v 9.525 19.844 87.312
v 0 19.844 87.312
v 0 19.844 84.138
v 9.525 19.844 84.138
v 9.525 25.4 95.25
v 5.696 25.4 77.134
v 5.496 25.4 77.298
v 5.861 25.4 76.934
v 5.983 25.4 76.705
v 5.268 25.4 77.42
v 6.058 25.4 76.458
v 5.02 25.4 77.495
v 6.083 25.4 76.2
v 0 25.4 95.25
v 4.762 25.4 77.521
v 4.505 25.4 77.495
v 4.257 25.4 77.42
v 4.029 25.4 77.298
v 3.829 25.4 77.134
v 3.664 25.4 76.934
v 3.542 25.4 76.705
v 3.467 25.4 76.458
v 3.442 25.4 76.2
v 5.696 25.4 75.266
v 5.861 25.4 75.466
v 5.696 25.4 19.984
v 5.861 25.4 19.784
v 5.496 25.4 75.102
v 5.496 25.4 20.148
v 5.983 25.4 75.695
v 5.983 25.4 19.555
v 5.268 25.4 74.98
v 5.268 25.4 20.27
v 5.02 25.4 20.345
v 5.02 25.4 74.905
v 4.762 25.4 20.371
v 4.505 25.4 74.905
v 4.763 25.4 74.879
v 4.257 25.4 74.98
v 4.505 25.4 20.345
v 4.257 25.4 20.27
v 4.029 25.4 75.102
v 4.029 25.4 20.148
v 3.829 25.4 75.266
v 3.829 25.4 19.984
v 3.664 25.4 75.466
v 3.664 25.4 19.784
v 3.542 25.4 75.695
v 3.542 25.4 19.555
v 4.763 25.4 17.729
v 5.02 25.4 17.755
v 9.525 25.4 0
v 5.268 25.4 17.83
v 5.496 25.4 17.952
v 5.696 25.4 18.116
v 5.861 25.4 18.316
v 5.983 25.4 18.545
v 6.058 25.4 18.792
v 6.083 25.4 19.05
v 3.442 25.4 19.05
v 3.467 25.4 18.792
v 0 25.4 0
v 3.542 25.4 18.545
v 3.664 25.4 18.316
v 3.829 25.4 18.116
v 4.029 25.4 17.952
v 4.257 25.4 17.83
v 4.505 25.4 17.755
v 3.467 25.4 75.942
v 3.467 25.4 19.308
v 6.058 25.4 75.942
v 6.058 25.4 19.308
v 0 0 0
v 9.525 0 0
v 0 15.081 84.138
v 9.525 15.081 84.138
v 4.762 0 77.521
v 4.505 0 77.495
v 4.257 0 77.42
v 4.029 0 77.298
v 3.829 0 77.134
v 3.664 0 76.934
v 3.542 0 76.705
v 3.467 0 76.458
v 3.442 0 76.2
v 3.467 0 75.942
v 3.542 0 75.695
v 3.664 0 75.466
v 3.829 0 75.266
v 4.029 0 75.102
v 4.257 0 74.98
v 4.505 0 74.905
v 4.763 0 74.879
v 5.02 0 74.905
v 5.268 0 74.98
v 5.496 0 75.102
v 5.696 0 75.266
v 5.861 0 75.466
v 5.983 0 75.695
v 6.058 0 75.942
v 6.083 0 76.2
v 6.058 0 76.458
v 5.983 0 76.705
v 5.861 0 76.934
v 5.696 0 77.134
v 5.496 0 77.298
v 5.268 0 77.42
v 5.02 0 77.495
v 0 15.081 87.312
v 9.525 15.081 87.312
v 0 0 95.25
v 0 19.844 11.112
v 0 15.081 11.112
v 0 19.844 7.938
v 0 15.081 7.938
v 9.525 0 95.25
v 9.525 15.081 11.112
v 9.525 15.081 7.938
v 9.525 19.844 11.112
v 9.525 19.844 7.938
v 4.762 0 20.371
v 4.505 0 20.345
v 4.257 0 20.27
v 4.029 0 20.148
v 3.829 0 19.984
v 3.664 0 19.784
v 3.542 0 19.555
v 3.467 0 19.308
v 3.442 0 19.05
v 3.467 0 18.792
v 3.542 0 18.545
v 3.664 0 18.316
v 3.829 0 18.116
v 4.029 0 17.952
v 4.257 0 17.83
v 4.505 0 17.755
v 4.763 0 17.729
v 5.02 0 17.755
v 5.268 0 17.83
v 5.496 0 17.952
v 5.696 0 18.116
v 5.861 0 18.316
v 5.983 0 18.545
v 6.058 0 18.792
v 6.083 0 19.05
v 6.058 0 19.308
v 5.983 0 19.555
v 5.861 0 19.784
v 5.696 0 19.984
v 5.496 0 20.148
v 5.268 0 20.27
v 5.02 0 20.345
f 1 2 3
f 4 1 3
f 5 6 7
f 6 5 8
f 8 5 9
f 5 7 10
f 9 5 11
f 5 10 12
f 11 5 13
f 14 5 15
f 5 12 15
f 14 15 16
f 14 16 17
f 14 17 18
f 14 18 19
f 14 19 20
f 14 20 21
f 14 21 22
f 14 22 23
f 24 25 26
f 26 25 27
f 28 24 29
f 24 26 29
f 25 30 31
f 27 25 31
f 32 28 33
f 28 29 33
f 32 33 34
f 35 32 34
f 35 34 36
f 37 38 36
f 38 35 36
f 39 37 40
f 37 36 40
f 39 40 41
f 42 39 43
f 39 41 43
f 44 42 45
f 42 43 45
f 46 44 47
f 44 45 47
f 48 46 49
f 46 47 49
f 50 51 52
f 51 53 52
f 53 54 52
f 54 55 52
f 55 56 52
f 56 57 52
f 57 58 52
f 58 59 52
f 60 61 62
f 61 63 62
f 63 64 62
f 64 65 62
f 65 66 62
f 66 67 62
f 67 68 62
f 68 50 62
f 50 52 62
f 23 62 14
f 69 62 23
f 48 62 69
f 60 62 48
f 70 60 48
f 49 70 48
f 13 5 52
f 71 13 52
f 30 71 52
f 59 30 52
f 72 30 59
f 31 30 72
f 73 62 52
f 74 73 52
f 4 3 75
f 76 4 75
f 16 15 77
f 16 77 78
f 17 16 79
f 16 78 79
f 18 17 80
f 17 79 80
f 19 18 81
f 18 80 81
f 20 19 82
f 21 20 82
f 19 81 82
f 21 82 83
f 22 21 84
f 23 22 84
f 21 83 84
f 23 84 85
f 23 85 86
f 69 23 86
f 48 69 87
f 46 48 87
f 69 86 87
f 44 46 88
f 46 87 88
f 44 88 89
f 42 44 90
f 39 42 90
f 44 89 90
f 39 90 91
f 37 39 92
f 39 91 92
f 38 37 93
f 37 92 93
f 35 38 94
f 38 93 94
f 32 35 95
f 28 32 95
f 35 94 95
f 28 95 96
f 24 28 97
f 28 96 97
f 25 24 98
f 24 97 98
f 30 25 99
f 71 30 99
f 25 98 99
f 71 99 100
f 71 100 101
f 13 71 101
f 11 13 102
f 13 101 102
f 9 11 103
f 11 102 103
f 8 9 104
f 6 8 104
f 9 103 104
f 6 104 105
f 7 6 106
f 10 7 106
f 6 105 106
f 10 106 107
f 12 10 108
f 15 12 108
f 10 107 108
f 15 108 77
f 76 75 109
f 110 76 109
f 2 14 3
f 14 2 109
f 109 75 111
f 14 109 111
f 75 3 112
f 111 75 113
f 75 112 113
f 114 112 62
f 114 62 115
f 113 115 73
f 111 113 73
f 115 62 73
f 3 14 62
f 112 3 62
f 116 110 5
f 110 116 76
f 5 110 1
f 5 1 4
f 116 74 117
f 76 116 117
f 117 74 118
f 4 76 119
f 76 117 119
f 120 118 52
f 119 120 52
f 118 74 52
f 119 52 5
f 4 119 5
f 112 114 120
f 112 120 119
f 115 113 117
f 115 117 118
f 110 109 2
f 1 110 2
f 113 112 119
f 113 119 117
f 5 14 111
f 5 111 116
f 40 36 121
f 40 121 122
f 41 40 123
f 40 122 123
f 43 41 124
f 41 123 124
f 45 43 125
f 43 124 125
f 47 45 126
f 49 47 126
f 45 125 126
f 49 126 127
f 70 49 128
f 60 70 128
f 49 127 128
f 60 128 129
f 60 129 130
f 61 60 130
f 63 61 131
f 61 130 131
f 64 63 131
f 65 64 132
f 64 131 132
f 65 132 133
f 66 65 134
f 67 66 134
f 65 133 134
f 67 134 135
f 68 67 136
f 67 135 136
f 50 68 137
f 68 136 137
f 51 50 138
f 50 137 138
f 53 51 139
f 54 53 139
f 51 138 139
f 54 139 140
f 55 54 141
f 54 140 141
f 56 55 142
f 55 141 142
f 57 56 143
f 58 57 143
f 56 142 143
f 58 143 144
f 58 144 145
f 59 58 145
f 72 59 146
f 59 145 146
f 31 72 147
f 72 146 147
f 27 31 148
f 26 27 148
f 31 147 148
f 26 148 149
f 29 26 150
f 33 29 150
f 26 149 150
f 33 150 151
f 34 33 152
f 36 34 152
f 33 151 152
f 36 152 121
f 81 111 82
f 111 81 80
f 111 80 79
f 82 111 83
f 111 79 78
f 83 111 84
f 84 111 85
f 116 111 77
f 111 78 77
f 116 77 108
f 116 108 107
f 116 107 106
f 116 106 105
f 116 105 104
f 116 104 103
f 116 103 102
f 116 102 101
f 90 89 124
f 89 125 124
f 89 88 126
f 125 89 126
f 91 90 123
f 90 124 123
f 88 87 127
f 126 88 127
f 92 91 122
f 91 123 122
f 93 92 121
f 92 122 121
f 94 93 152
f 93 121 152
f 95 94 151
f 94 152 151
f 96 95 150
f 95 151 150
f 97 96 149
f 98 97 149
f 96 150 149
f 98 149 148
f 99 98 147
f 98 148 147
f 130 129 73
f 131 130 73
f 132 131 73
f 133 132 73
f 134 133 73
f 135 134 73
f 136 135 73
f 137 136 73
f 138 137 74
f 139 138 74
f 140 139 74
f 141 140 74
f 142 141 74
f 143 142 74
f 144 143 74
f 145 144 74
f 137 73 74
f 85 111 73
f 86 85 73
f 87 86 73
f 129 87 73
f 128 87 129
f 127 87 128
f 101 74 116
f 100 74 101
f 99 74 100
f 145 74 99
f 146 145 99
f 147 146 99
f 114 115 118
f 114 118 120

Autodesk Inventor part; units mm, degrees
ref_plane "YZ Plane" through (0, 0, 0) normal (1, 0, 0) x (0, 1, 0)
ref_plane "XZ Plane" through (0, 0, 0) normal (0, 1, 0) x (-1, 0, 0)
ref_plane "XY Plane" through (0, 0, 0) normal (0, 0, 1) x (1, 0, 0)
sketch "Sketch1" plane through (0, 0, 0) normal (0, 0, 1) x (1, 0, 0)
  line L0 (0, 0) -> (9.525, 0)
  line L1 (9.525, 0) -> (9.525, 25.4)
  line L2 (9.525, 25.4) -> (0, 25.4)
  line L3 (0, 25.4) -> (0, 0)
  dimension "d0" = 9.525
  dimension "d1" = 25.4
extrude "Extrusion1" add sketch "Sketch1" along normal blind 95.25
sketch "Sketch2" plane through (0, 25.4, 0) normal (0, 1, 0) x (1, 0, 0)
  line L0 (0, 0) -> (0, -95.25) construction
  line L1 (0, -47.625) -> (9.525, -47.625) construction
  line L2 (9.525, 0) -> (9.525, -95.25) construction
  point P0 (4.7625, -19.05)
  point P1 (4.7625, -76.2)
  dimension "d4" = 19.05
  dimension "d5" = 4.7625
hole "Hole1" at (4.7625, 25.4, 19.05) at (4.7625, 25.4, 76.2) direction (0, -1, 0) diameter 2.6416 end through all thread size "6-32 UNC" class "2B" standard "ANSI Unified Screw Threads"
sketch "Sketch3" plane through (0, 0, 0) normal (-1, 0, 0) x (0, 0, 1)
  line L0 (0, 25.4) -> (0, 0) construction
  line L1 (0, 0) -> (95.25, 0) construction
  line L2 (95.25, 25.4) -> (95.25, 0) construction
  line L3 (0, 25.4) -> (95.25, 25.4) construction
  line L4 (7.9375, 19.8438) -> (11.1125, 19.8438)
  line L5 (11.1125, 19.8438) -> (11.1125, 15.0812)
  line L6 (11.1125, 15.0812) -> (7.9375, 15.0812)
  line L7 (7.9375, 15.0812) -> (7.9375, 19.8438)
  line L8 (7.9375, 19.8438) -> (11.1125, 15.0812) construction
  line L9 (11.1125, 19.8438) -> (7.9375, 15.0812) construction
  line L10 (0, 0) -> (95.25, 0) construction
  line L11 (47.625, 0) -> (47.625, 25.4) construction
  line L12 (87.3125, 19.8438) -> (84.1375, 19.8438)
  line L13 (84.1375, 19.8438) -> (84.1375, 15.0813)
  line L14 (84.1375, 15.0813) -> (87.3125, 15.0813)
  line L15 (87.3125, 15.0813) -> (87.3125, 19.8438)
  line L16 (87.3125, 19.8438) -> (84.1375, 15.0813) construction
  line L17 (84.1375, 19.8438) -> (87.3125, 15.0813) construction
  point P0 (9.525, 17.4625)
  point P1 (85.725, 17.4625)
  dimension "d13" = 3.175
  dimension "d14" = 4.7625
  dimension "d15" = 9.525
  dimension "d16" = 7.9375
extrude "Extrusion2" cut sketch "Sketch3" against normal through all
properties part number "ImagineFrameFront" material "Polycarbonate, Clear"
